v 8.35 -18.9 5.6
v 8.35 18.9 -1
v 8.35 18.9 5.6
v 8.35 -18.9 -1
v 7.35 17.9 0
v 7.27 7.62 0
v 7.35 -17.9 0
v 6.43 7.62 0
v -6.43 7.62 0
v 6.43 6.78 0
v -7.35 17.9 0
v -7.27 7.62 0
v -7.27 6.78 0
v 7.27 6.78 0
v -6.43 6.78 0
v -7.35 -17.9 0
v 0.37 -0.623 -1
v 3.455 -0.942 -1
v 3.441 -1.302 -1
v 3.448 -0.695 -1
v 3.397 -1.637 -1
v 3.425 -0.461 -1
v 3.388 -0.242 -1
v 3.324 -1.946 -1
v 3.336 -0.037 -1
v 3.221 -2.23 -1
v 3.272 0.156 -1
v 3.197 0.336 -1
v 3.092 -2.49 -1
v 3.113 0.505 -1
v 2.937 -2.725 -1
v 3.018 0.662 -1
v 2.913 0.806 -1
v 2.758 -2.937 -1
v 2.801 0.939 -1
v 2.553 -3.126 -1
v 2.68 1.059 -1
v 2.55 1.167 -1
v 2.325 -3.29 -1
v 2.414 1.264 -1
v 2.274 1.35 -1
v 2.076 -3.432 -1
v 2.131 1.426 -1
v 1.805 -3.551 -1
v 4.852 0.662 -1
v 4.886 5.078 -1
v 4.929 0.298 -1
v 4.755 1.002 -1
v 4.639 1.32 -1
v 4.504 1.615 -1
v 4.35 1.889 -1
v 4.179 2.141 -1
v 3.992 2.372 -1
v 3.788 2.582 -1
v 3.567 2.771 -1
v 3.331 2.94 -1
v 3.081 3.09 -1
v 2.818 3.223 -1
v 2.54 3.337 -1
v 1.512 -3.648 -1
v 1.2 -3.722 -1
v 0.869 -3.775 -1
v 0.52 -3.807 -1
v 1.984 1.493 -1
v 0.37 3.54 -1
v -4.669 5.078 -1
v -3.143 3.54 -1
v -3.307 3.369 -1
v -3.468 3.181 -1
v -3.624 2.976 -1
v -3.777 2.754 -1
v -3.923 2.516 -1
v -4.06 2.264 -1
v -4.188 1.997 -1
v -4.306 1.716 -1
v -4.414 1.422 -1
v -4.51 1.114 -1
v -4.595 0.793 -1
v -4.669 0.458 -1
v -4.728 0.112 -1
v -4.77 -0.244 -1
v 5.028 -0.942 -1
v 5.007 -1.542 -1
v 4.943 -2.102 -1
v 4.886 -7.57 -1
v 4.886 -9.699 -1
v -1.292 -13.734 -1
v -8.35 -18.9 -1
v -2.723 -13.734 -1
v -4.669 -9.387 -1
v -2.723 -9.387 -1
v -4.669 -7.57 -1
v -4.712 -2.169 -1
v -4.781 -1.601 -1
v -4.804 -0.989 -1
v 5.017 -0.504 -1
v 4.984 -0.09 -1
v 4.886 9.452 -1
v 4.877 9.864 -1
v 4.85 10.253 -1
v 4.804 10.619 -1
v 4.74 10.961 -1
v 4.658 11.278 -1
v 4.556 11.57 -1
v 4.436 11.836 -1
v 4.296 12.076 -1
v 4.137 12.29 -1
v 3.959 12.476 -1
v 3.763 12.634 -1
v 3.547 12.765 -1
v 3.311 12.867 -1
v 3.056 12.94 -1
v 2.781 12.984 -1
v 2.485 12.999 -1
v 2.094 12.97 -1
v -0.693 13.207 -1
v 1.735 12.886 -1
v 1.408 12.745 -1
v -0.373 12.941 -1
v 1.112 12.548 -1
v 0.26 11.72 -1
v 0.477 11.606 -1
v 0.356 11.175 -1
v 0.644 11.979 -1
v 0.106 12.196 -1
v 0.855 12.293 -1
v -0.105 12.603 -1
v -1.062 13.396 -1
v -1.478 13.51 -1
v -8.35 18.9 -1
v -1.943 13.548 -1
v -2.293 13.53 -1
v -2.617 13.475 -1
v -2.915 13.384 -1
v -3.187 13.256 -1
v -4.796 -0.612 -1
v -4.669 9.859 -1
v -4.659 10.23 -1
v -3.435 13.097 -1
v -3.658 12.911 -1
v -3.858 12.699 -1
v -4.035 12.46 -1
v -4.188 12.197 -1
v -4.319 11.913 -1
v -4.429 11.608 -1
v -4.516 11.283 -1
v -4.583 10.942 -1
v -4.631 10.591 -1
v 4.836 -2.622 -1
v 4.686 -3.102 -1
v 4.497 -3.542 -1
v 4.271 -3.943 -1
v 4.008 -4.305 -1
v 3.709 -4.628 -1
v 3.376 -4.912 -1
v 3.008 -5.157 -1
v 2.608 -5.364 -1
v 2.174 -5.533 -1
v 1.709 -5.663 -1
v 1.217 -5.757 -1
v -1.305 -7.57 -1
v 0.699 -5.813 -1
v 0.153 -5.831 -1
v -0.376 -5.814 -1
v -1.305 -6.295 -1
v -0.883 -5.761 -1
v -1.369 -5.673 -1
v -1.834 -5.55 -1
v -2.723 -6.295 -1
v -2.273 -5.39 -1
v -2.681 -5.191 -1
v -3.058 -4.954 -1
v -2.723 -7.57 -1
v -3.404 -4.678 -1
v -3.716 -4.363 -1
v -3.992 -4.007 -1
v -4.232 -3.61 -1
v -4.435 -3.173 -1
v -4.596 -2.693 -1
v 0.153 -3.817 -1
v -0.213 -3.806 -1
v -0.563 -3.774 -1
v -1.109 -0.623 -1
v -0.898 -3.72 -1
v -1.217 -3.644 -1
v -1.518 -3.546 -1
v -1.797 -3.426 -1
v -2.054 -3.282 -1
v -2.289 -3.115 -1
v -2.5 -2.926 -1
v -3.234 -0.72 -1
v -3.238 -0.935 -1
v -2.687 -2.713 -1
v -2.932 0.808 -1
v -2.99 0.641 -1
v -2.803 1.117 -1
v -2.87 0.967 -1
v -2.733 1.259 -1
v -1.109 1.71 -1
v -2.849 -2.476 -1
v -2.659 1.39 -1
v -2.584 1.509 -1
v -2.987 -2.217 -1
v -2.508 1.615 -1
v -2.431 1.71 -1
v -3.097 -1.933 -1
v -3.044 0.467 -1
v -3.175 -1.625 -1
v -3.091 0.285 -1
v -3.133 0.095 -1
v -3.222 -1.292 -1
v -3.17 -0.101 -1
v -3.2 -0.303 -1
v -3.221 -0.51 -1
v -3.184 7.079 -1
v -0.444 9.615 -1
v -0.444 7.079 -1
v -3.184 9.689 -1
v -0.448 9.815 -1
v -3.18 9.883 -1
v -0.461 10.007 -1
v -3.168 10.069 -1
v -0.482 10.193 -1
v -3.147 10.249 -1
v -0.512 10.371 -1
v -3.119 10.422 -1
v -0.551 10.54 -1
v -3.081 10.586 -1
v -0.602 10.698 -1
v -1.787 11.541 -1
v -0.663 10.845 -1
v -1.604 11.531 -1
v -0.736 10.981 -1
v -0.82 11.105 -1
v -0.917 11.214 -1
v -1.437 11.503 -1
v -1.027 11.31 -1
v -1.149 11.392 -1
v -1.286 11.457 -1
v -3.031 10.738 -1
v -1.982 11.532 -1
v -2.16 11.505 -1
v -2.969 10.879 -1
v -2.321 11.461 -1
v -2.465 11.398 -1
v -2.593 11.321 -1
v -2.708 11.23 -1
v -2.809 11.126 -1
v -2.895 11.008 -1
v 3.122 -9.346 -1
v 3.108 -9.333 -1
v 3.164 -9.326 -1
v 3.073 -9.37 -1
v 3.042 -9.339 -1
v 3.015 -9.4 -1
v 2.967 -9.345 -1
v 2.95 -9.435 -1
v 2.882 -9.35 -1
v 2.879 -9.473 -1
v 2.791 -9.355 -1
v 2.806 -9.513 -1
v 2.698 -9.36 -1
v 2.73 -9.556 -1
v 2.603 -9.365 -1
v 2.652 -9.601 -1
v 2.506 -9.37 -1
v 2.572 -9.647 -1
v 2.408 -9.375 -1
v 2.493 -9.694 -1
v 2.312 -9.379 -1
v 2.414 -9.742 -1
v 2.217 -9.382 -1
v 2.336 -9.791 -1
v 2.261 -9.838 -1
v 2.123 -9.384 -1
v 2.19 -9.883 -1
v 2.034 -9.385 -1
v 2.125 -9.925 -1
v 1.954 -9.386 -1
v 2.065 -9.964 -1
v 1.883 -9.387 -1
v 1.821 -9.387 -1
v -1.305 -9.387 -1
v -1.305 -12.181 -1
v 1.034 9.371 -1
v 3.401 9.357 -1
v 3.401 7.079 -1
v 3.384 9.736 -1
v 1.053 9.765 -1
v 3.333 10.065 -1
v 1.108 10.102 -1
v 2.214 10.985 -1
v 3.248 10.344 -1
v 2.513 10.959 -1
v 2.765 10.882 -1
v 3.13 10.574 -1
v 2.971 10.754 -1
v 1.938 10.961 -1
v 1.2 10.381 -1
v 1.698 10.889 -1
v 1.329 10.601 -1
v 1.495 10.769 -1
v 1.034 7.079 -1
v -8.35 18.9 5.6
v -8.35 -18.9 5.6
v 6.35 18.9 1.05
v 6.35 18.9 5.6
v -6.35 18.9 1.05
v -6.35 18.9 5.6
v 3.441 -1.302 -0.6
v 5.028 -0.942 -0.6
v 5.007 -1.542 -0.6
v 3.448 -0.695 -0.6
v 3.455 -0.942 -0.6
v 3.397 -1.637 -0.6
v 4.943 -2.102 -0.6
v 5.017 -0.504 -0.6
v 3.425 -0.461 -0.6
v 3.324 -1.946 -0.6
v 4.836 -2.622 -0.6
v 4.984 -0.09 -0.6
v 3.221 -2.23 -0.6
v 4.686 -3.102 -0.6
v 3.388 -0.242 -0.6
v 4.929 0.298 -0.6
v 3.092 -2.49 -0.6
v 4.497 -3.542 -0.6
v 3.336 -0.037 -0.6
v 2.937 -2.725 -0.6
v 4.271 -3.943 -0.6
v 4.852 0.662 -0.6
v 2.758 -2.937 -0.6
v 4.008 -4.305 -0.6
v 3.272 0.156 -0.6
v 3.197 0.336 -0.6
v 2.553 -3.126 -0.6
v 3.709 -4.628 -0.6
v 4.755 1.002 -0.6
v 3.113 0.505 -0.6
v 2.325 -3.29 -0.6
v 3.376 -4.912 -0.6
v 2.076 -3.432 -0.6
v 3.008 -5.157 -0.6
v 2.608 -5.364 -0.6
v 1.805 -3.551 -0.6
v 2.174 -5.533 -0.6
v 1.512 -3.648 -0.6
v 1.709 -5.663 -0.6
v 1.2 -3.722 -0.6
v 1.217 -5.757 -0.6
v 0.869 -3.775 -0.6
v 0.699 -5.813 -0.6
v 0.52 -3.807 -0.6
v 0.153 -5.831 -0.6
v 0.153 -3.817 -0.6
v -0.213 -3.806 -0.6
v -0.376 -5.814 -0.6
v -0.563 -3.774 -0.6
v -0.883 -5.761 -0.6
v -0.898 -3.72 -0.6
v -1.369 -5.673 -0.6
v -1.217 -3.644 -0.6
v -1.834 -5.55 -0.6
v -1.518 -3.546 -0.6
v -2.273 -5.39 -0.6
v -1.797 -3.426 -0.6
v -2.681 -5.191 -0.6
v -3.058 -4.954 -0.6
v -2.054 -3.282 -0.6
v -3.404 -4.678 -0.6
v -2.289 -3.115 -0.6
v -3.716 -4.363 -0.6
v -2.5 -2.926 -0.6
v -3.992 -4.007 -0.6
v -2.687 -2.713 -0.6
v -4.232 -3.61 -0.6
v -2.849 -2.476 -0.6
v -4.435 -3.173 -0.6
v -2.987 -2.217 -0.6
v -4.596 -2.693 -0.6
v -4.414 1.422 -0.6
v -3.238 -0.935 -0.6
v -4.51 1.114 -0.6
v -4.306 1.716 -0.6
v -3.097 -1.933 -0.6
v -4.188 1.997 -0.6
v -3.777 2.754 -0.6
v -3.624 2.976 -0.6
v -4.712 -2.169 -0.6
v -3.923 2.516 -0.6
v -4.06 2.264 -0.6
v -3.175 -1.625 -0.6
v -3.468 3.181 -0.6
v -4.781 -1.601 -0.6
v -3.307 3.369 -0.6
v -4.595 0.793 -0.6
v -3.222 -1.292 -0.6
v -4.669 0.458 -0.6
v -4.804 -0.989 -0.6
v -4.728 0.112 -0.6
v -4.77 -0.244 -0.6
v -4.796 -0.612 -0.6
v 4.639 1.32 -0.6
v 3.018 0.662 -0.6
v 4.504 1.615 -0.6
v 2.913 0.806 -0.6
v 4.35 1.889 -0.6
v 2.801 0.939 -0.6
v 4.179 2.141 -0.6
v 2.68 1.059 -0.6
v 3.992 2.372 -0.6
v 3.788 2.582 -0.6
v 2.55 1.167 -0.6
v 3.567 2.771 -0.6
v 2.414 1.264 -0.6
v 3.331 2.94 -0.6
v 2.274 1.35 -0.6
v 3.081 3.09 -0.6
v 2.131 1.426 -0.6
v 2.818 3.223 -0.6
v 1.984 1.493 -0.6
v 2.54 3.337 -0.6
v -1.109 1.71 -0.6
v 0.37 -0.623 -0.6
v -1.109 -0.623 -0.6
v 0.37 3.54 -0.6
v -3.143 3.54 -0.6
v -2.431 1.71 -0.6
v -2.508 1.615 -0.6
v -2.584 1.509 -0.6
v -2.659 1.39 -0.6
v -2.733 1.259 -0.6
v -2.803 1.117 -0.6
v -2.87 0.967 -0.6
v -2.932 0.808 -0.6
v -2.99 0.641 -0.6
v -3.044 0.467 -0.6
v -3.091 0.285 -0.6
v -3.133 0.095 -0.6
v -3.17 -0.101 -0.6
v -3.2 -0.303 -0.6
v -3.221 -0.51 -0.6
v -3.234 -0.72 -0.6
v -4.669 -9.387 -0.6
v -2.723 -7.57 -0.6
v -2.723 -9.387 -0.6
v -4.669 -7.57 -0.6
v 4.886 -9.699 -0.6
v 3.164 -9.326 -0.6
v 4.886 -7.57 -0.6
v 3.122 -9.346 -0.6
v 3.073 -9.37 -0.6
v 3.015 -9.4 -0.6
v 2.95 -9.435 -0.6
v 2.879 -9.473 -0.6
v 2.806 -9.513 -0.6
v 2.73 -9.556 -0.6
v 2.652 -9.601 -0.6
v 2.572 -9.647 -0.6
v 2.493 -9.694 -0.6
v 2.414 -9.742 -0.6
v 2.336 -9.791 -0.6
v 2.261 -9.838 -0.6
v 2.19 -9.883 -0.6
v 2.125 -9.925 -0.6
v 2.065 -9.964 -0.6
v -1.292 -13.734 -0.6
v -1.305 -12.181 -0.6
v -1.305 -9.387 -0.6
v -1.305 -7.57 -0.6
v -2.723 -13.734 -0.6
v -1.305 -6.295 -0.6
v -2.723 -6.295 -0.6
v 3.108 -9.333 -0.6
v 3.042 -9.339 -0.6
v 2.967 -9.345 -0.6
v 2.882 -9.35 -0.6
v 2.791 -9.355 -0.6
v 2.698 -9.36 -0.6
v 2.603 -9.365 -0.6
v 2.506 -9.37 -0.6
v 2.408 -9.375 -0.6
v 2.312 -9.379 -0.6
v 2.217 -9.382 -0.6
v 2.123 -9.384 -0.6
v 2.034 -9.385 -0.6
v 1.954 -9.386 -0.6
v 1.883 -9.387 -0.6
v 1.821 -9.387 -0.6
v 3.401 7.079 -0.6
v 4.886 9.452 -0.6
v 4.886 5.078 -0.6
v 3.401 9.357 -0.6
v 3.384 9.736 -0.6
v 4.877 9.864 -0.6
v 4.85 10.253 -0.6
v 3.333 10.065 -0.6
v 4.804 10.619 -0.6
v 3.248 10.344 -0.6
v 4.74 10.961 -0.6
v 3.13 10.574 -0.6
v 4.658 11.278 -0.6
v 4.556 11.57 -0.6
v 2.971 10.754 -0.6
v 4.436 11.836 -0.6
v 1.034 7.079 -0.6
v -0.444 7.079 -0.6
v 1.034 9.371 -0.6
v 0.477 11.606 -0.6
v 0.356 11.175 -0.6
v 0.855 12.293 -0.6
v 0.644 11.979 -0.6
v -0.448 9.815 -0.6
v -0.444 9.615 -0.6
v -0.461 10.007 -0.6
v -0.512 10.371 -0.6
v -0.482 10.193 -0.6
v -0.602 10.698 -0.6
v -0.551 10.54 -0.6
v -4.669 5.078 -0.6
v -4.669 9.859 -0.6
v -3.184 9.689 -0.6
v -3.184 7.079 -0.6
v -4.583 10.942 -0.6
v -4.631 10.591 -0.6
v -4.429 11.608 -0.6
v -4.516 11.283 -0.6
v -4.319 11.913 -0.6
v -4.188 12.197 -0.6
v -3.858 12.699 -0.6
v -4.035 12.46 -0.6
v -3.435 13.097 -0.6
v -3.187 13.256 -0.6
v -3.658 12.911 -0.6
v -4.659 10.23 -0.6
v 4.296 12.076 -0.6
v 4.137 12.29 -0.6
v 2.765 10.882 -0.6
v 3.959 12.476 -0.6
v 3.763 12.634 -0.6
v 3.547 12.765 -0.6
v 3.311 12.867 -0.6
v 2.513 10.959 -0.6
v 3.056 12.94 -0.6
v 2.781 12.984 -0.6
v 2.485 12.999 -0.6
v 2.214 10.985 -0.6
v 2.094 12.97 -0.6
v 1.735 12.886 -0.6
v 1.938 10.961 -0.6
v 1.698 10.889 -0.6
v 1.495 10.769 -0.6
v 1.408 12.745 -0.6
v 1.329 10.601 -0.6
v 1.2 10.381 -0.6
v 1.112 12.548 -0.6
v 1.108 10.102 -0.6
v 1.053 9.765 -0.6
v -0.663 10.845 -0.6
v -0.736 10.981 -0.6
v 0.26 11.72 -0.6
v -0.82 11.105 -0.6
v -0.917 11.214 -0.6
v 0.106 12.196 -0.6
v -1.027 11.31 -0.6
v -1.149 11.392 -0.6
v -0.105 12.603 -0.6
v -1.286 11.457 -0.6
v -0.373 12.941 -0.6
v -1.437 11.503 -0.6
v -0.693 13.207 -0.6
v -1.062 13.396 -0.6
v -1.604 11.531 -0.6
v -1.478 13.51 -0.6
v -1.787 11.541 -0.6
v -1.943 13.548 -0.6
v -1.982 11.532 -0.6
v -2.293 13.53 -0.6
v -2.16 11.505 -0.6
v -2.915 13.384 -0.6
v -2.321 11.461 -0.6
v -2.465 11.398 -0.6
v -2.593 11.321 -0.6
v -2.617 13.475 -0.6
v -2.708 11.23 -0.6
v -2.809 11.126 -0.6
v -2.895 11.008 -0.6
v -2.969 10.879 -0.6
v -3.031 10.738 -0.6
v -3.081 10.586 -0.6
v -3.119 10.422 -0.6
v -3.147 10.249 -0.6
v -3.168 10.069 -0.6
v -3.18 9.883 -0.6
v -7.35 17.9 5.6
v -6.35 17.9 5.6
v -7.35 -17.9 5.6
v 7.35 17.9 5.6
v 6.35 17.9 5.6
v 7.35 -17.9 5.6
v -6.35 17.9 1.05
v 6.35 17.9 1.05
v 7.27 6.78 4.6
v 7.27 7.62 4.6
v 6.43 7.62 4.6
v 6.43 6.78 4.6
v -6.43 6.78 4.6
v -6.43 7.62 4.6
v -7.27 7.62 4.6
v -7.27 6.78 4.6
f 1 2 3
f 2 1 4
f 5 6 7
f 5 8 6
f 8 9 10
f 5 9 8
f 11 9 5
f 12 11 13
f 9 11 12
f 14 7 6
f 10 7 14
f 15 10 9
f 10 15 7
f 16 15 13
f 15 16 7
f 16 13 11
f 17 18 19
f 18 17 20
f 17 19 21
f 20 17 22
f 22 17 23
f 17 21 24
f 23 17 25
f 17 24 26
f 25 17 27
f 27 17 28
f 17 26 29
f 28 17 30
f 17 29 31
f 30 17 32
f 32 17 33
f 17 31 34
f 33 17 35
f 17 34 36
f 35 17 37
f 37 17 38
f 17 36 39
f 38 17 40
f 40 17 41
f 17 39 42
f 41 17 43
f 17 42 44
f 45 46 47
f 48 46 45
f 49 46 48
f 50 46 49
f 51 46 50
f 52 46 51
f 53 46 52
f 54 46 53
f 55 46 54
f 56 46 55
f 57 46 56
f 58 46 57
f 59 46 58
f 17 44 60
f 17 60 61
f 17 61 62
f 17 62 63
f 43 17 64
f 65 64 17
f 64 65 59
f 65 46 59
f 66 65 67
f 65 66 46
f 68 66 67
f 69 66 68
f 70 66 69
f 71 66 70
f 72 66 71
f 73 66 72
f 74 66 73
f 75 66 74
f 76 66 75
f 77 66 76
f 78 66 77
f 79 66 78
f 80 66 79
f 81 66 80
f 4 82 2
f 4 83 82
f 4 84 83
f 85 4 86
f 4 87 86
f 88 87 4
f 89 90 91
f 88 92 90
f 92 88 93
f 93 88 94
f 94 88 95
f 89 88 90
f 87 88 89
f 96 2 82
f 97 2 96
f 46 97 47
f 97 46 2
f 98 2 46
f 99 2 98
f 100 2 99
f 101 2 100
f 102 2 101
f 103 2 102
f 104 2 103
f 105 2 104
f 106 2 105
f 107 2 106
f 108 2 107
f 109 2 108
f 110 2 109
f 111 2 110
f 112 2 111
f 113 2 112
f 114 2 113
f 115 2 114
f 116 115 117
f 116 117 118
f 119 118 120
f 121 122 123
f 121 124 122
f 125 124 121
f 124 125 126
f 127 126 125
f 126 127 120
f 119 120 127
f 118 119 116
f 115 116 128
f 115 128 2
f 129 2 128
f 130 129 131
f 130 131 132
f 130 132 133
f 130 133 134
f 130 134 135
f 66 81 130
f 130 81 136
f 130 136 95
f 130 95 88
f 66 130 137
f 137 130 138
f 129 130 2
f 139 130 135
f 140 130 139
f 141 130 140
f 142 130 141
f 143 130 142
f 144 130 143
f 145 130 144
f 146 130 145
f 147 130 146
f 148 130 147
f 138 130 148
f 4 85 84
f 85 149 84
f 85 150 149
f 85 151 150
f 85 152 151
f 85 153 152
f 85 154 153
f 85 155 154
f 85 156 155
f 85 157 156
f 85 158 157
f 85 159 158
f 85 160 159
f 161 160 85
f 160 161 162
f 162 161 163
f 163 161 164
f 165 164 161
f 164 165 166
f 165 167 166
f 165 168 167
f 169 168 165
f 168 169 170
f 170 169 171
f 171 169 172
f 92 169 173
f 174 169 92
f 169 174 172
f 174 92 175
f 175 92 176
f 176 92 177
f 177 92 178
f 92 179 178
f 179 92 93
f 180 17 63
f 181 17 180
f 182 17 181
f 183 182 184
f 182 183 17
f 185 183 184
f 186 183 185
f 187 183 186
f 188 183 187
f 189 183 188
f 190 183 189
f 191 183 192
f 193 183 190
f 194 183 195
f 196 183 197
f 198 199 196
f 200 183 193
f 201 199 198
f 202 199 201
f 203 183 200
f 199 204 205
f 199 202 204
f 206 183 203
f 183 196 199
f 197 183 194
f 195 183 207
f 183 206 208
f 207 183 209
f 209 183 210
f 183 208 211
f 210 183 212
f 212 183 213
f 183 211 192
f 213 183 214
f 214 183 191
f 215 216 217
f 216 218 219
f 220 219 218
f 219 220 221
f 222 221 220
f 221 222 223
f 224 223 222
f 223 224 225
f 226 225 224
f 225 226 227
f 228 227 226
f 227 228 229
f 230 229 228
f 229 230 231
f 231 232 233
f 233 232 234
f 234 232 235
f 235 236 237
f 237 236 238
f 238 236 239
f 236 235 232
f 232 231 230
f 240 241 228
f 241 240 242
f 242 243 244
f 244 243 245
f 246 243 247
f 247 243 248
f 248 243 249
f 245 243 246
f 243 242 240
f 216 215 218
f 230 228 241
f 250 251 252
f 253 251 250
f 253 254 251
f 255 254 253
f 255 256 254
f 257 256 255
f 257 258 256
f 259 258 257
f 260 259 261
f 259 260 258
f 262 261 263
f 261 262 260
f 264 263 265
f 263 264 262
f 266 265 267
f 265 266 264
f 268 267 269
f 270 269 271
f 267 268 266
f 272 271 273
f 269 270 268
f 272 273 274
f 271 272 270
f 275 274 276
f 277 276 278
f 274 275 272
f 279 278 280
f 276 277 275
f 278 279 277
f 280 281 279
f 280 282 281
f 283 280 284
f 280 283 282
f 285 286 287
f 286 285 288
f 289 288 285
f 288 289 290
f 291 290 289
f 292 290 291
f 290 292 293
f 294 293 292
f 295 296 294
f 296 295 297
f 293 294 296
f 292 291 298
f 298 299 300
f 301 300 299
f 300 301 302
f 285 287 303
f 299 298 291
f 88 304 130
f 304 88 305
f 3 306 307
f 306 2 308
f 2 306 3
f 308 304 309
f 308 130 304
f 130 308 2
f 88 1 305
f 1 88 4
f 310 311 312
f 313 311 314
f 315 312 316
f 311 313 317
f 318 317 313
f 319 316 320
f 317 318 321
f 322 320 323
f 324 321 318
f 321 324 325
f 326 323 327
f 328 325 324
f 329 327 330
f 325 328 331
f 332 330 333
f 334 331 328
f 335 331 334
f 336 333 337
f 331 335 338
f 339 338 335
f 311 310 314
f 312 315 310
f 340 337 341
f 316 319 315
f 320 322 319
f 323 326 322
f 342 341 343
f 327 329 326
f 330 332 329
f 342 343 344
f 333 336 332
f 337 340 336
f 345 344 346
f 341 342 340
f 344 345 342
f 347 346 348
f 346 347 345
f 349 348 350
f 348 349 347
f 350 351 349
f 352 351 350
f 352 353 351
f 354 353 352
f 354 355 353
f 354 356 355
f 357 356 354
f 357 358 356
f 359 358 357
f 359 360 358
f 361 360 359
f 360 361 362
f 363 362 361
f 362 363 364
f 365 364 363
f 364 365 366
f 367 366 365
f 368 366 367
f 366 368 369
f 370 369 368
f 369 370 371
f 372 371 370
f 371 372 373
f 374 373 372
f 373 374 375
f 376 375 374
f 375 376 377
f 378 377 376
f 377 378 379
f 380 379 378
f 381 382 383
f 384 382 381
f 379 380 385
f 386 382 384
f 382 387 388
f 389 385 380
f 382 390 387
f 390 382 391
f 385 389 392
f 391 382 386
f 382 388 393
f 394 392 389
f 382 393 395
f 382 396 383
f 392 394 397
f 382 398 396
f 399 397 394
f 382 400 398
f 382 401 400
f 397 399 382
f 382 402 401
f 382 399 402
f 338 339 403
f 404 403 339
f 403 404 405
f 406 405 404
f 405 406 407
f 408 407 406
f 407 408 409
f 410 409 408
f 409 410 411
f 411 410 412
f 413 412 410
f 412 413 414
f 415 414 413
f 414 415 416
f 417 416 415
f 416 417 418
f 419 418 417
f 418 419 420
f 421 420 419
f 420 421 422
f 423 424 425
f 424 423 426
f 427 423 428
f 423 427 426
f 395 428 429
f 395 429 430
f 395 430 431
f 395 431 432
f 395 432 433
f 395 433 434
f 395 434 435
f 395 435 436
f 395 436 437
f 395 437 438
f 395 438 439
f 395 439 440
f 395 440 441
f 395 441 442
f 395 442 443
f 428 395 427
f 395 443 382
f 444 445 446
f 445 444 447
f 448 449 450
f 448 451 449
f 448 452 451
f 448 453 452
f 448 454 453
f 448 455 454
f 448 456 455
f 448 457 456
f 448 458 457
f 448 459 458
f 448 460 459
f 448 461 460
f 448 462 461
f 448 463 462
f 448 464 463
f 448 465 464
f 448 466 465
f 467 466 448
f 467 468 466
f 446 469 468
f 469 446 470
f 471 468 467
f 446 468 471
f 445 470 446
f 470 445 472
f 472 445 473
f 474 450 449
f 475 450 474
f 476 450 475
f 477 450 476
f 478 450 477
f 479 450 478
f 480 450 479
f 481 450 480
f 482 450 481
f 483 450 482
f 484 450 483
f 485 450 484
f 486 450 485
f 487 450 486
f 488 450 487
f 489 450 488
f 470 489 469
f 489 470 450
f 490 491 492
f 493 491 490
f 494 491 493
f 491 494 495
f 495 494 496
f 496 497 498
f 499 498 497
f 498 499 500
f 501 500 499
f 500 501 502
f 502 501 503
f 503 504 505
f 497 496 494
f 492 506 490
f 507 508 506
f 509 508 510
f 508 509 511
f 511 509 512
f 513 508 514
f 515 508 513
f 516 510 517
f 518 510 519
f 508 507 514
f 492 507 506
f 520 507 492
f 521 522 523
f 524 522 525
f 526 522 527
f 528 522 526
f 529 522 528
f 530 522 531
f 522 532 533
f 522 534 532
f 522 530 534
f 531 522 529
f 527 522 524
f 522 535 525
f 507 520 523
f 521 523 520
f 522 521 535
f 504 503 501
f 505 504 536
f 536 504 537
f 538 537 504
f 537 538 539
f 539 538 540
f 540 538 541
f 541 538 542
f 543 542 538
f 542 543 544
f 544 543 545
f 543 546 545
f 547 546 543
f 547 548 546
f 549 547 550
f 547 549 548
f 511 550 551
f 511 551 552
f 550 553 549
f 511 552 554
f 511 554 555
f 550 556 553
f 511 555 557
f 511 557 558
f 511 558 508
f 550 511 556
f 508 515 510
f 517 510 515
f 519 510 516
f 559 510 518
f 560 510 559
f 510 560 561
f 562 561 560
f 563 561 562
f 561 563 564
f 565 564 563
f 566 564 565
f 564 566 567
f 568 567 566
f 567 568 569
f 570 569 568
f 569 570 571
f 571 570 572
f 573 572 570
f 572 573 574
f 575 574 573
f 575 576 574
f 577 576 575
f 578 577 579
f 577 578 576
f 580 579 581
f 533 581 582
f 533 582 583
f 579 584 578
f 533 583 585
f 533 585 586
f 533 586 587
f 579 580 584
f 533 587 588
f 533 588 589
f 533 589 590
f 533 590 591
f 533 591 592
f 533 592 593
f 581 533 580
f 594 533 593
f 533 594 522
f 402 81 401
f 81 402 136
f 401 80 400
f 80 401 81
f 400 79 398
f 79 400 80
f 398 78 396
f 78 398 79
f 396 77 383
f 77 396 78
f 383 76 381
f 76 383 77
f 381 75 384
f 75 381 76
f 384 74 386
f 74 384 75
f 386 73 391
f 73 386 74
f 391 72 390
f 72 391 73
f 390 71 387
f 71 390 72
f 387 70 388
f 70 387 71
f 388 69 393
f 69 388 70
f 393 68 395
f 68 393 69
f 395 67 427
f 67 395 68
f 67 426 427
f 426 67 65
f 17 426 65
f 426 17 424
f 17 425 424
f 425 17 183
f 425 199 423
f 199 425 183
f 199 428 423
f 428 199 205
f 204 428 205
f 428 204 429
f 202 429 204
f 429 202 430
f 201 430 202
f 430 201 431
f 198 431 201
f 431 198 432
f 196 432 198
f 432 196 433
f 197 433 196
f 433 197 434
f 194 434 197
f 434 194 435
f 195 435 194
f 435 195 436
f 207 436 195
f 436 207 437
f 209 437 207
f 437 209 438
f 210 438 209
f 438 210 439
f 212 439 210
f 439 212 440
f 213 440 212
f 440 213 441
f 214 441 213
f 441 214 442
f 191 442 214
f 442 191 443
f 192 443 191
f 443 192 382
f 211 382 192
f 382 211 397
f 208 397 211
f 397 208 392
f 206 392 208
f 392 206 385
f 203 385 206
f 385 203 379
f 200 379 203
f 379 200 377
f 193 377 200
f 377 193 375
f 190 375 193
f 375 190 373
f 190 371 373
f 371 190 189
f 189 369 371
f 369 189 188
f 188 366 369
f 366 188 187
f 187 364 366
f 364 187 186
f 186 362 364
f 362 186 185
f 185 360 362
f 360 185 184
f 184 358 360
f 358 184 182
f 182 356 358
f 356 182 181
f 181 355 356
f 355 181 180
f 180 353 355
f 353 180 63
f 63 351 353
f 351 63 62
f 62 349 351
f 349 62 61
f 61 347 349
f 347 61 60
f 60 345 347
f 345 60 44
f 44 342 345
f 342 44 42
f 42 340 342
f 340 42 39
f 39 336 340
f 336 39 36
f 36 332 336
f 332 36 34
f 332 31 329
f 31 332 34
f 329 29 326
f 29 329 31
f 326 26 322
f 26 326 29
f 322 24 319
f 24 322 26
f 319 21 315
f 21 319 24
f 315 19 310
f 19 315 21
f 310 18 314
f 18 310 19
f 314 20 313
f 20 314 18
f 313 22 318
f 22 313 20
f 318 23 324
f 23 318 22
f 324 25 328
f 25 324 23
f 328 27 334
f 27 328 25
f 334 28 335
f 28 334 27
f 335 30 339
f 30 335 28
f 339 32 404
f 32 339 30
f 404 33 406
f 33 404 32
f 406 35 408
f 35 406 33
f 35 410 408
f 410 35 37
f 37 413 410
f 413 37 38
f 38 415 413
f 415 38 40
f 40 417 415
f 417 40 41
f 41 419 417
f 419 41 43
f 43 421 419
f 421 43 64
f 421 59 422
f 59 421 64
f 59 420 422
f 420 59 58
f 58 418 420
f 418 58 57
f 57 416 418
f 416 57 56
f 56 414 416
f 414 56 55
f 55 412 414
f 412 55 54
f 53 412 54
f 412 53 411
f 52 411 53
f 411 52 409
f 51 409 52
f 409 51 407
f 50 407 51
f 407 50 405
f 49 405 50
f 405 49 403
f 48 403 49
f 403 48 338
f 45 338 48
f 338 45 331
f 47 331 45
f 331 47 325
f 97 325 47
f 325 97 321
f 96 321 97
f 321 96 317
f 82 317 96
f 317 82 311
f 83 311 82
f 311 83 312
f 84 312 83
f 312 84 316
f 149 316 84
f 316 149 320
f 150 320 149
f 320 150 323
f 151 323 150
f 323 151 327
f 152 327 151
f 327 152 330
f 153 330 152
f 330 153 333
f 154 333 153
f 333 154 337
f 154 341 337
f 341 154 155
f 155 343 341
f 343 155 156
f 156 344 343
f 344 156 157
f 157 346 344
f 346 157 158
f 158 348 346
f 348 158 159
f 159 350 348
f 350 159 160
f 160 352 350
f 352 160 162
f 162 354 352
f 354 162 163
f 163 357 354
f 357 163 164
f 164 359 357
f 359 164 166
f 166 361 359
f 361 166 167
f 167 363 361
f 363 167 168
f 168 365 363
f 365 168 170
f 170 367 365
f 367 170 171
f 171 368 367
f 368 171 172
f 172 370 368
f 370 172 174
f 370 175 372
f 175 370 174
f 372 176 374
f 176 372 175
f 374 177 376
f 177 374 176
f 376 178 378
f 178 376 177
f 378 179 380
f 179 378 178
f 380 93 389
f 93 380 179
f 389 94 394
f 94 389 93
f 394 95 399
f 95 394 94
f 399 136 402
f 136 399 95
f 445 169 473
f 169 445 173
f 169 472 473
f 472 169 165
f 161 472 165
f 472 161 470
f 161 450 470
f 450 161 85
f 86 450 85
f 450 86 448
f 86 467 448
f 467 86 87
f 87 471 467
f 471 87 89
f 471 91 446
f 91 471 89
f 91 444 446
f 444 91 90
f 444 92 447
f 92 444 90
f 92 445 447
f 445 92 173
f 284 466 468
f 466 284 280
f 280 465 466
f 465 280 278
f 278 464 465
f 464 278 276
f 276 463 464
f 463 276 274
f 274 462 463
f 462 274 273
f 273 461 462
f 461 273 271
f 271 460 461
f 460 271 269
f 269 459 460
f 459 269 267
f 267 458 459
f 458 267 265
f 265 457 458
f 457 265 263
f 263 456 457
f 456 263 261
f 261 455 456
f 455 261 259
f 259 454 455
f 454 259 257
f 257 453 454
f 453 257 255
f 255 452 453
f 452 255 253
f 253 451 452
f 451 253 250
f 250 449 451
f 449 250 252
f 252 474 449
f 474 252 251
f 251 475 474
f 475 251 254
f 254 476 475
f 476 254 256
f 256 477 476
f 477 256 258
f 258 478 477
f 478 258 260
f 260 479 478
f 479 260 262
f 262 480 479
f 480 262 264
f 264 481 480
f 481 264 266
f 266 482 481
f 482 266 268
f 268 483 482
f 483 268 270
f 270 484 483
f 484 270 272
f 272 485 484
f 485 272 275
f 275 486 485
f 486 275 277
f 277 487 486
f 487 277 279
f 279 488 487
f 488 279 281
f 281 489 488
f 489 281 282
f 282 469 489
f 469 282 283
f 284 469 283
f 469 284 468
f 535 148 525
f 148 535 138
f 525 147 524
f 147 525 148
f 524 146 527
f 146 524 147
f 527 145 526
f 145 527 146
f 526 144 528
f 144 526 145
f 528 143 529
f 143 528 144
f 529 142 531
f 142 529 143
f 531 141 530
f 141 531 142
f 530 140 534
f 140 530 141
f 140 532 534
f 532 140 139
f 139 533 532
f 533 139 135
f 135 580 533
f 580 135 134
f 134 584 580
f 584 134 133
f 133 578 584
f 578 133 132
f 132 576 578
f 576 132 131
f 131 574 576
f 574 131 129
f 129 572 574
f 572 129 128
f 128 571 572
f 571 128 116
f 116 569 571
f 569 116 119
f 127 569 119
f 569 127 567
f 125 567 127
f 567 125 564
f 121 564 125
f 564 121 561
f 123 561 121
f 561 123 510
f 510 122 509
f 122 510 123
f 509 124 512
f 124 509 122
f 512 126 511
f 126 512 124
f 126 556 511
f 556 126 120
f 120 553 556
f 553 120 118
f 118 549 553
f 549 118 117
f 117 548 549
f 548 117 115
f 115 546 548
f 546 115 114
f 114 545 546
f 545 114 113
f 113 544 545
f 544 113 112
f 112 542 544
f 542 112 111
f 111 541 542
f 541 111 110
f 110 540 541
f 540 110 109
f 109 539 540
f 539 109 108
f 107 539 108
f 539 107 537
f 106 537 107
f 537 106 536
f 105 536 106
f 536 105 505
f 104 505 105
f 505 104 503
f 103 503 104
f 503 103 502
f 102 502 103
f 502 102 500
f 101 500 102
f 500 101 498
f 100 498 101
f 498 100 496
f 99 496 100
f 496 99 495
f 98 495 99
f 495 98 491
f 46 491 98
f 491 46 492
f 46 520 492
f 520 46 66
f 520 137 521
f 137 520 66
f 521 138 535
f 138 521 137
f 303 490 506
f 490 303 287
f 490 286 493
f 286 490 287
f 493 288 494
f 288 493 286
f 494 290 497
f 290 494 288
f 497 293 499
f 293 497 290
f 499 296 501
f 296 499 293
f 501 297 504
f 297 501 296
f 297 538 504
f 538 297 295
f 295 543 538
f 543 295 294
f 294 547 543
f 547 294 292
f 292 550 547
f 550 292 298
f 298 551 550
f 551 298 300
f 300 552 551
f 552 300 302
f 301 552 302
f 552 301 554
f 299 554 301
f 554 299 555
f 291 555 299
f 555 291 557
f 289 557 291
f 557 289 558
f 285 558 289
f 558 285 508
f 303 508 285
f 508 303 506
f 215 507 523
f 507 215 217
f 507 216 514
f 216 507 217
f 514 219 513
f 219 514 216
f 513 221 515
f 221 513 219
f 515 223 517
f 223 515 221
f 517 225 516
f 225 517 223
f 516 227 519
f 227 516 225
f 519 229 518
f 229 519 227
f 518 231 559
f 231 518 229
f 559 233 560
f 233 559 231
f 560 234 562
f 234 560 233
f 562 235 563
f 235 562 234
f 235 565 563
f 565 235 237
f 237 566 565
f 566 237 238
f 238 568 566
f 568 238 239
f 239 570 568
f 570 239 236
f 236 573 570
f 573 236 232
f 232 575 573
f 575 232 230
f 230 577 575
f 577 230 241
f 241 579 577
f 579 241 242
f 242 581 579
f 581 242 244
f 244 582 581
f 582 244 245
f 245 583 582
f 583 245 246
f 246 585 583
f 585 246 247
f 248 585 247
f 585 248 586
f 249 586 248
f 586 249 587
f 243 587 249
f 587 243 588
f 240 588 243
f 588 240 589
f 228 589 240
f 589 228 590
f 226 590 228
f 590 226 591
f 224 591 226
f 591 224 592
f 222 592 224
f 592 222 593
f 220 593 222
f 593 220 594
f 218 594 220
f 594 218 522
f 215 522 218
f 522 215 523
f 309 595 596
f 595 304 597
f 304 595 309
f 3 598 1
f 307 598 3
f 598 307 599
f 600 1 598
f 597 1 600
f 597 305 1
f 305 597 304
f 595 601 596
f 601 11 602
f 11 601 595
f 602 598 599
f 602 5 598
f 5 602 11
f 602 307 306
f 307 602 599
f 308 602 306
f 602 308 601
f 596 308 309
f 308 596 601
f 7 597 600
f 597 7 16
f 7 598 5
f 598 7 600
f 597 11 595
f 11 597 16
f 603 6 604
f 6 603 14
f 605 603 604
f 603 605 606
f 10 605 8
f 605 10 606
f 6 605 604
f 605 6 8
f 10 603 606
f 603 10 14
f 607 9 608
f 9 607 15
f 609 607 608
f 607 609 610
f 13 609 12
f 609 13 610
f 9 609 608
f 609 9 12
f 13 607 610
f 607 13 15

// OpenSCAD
notchDepth = 1.2; //Depth of slots on the side of the PCB
notchWidth = 1.2; //Width of slots on the side of the PCB
portLength = 23.4; //Distance between the front of the slot to the end of the USB port
boardLength = 23.4; //Dsitance from the rear of the slot to the back of the board
boardWidth = 14.7; // Width from one side of the board to the other, you may want to add some tolerance
capacity = "4GB"; //The capacity of the drive to be written on the bottom
textSize = 10; // If you have a very large or small drive you can change the text size (default = 6)

USBLength = 12.2; // The required length of protruding port (should remain constant)
USBHeight = 4.6; // The height of a USB port (should remain constant)
USBWidth = 12.7; // The width of a USB port (should remain constant)

unitLength = boardLength+notchWidth+(portLength-USBLength)+2;
difference(){
    translate([0, 0, -0.5])
        cube([boardWidth+2, unitLength,1], center=true);
    translate([0,0,-0.6])
        rotate([180,0,90])
            linear_extrude(height = 0.5)
                text(text = capacity, font = "Liberation Sans:style=Bold", size = textSize, valign = "center", halign = "center");
}
translate([0, (unitLength-1)/-2, ((USBHeight+2)/2)-1])
    cube([boardWidth+2, 1, USBHeight+2], center=true);
difference(){
    translate([0, (unitLength-1)/2, ((USBHeight+2)/2)-1])
        cube([boardWidth+2, 1, USBHeight+2], center=true);
    translate([0, (unitLength-1)/2, ((USBHeight+2)/2)+0.1])
        cube([USBWidth, 1.1, USBHeight+0.1], center=true);
}
translate([(boardWidth/2)+0.5, 0, ((USBHeight+2)/2)-1])
    cube([1, unitLength, USBHeight+2],center = true);
translate([-(boardWidth/2)-0.5, 0, ((USBHeight+2)/2)-1])
    cube([1, unitLength, USBHeight+2],center = true);
translate([(boardWidth/2)-0.5, ((unitLength-1)/2)-(portLength-USBLength), ((USBHeight)/2)])
    cube([notchDepth-(notchDepth*0.3), notchWidth-(notchWidth*0.3), USBHeight], center = true);
translate([(boardWidth/-2)+0.5, ((unitLength-1)/2)-(portLength-USBLength), ((USBHeight)/2)])
    cube([notchDepth-(notchDepth*0.3), notchWidth-(notchWidth*0.3), USBHeight], center = true);
